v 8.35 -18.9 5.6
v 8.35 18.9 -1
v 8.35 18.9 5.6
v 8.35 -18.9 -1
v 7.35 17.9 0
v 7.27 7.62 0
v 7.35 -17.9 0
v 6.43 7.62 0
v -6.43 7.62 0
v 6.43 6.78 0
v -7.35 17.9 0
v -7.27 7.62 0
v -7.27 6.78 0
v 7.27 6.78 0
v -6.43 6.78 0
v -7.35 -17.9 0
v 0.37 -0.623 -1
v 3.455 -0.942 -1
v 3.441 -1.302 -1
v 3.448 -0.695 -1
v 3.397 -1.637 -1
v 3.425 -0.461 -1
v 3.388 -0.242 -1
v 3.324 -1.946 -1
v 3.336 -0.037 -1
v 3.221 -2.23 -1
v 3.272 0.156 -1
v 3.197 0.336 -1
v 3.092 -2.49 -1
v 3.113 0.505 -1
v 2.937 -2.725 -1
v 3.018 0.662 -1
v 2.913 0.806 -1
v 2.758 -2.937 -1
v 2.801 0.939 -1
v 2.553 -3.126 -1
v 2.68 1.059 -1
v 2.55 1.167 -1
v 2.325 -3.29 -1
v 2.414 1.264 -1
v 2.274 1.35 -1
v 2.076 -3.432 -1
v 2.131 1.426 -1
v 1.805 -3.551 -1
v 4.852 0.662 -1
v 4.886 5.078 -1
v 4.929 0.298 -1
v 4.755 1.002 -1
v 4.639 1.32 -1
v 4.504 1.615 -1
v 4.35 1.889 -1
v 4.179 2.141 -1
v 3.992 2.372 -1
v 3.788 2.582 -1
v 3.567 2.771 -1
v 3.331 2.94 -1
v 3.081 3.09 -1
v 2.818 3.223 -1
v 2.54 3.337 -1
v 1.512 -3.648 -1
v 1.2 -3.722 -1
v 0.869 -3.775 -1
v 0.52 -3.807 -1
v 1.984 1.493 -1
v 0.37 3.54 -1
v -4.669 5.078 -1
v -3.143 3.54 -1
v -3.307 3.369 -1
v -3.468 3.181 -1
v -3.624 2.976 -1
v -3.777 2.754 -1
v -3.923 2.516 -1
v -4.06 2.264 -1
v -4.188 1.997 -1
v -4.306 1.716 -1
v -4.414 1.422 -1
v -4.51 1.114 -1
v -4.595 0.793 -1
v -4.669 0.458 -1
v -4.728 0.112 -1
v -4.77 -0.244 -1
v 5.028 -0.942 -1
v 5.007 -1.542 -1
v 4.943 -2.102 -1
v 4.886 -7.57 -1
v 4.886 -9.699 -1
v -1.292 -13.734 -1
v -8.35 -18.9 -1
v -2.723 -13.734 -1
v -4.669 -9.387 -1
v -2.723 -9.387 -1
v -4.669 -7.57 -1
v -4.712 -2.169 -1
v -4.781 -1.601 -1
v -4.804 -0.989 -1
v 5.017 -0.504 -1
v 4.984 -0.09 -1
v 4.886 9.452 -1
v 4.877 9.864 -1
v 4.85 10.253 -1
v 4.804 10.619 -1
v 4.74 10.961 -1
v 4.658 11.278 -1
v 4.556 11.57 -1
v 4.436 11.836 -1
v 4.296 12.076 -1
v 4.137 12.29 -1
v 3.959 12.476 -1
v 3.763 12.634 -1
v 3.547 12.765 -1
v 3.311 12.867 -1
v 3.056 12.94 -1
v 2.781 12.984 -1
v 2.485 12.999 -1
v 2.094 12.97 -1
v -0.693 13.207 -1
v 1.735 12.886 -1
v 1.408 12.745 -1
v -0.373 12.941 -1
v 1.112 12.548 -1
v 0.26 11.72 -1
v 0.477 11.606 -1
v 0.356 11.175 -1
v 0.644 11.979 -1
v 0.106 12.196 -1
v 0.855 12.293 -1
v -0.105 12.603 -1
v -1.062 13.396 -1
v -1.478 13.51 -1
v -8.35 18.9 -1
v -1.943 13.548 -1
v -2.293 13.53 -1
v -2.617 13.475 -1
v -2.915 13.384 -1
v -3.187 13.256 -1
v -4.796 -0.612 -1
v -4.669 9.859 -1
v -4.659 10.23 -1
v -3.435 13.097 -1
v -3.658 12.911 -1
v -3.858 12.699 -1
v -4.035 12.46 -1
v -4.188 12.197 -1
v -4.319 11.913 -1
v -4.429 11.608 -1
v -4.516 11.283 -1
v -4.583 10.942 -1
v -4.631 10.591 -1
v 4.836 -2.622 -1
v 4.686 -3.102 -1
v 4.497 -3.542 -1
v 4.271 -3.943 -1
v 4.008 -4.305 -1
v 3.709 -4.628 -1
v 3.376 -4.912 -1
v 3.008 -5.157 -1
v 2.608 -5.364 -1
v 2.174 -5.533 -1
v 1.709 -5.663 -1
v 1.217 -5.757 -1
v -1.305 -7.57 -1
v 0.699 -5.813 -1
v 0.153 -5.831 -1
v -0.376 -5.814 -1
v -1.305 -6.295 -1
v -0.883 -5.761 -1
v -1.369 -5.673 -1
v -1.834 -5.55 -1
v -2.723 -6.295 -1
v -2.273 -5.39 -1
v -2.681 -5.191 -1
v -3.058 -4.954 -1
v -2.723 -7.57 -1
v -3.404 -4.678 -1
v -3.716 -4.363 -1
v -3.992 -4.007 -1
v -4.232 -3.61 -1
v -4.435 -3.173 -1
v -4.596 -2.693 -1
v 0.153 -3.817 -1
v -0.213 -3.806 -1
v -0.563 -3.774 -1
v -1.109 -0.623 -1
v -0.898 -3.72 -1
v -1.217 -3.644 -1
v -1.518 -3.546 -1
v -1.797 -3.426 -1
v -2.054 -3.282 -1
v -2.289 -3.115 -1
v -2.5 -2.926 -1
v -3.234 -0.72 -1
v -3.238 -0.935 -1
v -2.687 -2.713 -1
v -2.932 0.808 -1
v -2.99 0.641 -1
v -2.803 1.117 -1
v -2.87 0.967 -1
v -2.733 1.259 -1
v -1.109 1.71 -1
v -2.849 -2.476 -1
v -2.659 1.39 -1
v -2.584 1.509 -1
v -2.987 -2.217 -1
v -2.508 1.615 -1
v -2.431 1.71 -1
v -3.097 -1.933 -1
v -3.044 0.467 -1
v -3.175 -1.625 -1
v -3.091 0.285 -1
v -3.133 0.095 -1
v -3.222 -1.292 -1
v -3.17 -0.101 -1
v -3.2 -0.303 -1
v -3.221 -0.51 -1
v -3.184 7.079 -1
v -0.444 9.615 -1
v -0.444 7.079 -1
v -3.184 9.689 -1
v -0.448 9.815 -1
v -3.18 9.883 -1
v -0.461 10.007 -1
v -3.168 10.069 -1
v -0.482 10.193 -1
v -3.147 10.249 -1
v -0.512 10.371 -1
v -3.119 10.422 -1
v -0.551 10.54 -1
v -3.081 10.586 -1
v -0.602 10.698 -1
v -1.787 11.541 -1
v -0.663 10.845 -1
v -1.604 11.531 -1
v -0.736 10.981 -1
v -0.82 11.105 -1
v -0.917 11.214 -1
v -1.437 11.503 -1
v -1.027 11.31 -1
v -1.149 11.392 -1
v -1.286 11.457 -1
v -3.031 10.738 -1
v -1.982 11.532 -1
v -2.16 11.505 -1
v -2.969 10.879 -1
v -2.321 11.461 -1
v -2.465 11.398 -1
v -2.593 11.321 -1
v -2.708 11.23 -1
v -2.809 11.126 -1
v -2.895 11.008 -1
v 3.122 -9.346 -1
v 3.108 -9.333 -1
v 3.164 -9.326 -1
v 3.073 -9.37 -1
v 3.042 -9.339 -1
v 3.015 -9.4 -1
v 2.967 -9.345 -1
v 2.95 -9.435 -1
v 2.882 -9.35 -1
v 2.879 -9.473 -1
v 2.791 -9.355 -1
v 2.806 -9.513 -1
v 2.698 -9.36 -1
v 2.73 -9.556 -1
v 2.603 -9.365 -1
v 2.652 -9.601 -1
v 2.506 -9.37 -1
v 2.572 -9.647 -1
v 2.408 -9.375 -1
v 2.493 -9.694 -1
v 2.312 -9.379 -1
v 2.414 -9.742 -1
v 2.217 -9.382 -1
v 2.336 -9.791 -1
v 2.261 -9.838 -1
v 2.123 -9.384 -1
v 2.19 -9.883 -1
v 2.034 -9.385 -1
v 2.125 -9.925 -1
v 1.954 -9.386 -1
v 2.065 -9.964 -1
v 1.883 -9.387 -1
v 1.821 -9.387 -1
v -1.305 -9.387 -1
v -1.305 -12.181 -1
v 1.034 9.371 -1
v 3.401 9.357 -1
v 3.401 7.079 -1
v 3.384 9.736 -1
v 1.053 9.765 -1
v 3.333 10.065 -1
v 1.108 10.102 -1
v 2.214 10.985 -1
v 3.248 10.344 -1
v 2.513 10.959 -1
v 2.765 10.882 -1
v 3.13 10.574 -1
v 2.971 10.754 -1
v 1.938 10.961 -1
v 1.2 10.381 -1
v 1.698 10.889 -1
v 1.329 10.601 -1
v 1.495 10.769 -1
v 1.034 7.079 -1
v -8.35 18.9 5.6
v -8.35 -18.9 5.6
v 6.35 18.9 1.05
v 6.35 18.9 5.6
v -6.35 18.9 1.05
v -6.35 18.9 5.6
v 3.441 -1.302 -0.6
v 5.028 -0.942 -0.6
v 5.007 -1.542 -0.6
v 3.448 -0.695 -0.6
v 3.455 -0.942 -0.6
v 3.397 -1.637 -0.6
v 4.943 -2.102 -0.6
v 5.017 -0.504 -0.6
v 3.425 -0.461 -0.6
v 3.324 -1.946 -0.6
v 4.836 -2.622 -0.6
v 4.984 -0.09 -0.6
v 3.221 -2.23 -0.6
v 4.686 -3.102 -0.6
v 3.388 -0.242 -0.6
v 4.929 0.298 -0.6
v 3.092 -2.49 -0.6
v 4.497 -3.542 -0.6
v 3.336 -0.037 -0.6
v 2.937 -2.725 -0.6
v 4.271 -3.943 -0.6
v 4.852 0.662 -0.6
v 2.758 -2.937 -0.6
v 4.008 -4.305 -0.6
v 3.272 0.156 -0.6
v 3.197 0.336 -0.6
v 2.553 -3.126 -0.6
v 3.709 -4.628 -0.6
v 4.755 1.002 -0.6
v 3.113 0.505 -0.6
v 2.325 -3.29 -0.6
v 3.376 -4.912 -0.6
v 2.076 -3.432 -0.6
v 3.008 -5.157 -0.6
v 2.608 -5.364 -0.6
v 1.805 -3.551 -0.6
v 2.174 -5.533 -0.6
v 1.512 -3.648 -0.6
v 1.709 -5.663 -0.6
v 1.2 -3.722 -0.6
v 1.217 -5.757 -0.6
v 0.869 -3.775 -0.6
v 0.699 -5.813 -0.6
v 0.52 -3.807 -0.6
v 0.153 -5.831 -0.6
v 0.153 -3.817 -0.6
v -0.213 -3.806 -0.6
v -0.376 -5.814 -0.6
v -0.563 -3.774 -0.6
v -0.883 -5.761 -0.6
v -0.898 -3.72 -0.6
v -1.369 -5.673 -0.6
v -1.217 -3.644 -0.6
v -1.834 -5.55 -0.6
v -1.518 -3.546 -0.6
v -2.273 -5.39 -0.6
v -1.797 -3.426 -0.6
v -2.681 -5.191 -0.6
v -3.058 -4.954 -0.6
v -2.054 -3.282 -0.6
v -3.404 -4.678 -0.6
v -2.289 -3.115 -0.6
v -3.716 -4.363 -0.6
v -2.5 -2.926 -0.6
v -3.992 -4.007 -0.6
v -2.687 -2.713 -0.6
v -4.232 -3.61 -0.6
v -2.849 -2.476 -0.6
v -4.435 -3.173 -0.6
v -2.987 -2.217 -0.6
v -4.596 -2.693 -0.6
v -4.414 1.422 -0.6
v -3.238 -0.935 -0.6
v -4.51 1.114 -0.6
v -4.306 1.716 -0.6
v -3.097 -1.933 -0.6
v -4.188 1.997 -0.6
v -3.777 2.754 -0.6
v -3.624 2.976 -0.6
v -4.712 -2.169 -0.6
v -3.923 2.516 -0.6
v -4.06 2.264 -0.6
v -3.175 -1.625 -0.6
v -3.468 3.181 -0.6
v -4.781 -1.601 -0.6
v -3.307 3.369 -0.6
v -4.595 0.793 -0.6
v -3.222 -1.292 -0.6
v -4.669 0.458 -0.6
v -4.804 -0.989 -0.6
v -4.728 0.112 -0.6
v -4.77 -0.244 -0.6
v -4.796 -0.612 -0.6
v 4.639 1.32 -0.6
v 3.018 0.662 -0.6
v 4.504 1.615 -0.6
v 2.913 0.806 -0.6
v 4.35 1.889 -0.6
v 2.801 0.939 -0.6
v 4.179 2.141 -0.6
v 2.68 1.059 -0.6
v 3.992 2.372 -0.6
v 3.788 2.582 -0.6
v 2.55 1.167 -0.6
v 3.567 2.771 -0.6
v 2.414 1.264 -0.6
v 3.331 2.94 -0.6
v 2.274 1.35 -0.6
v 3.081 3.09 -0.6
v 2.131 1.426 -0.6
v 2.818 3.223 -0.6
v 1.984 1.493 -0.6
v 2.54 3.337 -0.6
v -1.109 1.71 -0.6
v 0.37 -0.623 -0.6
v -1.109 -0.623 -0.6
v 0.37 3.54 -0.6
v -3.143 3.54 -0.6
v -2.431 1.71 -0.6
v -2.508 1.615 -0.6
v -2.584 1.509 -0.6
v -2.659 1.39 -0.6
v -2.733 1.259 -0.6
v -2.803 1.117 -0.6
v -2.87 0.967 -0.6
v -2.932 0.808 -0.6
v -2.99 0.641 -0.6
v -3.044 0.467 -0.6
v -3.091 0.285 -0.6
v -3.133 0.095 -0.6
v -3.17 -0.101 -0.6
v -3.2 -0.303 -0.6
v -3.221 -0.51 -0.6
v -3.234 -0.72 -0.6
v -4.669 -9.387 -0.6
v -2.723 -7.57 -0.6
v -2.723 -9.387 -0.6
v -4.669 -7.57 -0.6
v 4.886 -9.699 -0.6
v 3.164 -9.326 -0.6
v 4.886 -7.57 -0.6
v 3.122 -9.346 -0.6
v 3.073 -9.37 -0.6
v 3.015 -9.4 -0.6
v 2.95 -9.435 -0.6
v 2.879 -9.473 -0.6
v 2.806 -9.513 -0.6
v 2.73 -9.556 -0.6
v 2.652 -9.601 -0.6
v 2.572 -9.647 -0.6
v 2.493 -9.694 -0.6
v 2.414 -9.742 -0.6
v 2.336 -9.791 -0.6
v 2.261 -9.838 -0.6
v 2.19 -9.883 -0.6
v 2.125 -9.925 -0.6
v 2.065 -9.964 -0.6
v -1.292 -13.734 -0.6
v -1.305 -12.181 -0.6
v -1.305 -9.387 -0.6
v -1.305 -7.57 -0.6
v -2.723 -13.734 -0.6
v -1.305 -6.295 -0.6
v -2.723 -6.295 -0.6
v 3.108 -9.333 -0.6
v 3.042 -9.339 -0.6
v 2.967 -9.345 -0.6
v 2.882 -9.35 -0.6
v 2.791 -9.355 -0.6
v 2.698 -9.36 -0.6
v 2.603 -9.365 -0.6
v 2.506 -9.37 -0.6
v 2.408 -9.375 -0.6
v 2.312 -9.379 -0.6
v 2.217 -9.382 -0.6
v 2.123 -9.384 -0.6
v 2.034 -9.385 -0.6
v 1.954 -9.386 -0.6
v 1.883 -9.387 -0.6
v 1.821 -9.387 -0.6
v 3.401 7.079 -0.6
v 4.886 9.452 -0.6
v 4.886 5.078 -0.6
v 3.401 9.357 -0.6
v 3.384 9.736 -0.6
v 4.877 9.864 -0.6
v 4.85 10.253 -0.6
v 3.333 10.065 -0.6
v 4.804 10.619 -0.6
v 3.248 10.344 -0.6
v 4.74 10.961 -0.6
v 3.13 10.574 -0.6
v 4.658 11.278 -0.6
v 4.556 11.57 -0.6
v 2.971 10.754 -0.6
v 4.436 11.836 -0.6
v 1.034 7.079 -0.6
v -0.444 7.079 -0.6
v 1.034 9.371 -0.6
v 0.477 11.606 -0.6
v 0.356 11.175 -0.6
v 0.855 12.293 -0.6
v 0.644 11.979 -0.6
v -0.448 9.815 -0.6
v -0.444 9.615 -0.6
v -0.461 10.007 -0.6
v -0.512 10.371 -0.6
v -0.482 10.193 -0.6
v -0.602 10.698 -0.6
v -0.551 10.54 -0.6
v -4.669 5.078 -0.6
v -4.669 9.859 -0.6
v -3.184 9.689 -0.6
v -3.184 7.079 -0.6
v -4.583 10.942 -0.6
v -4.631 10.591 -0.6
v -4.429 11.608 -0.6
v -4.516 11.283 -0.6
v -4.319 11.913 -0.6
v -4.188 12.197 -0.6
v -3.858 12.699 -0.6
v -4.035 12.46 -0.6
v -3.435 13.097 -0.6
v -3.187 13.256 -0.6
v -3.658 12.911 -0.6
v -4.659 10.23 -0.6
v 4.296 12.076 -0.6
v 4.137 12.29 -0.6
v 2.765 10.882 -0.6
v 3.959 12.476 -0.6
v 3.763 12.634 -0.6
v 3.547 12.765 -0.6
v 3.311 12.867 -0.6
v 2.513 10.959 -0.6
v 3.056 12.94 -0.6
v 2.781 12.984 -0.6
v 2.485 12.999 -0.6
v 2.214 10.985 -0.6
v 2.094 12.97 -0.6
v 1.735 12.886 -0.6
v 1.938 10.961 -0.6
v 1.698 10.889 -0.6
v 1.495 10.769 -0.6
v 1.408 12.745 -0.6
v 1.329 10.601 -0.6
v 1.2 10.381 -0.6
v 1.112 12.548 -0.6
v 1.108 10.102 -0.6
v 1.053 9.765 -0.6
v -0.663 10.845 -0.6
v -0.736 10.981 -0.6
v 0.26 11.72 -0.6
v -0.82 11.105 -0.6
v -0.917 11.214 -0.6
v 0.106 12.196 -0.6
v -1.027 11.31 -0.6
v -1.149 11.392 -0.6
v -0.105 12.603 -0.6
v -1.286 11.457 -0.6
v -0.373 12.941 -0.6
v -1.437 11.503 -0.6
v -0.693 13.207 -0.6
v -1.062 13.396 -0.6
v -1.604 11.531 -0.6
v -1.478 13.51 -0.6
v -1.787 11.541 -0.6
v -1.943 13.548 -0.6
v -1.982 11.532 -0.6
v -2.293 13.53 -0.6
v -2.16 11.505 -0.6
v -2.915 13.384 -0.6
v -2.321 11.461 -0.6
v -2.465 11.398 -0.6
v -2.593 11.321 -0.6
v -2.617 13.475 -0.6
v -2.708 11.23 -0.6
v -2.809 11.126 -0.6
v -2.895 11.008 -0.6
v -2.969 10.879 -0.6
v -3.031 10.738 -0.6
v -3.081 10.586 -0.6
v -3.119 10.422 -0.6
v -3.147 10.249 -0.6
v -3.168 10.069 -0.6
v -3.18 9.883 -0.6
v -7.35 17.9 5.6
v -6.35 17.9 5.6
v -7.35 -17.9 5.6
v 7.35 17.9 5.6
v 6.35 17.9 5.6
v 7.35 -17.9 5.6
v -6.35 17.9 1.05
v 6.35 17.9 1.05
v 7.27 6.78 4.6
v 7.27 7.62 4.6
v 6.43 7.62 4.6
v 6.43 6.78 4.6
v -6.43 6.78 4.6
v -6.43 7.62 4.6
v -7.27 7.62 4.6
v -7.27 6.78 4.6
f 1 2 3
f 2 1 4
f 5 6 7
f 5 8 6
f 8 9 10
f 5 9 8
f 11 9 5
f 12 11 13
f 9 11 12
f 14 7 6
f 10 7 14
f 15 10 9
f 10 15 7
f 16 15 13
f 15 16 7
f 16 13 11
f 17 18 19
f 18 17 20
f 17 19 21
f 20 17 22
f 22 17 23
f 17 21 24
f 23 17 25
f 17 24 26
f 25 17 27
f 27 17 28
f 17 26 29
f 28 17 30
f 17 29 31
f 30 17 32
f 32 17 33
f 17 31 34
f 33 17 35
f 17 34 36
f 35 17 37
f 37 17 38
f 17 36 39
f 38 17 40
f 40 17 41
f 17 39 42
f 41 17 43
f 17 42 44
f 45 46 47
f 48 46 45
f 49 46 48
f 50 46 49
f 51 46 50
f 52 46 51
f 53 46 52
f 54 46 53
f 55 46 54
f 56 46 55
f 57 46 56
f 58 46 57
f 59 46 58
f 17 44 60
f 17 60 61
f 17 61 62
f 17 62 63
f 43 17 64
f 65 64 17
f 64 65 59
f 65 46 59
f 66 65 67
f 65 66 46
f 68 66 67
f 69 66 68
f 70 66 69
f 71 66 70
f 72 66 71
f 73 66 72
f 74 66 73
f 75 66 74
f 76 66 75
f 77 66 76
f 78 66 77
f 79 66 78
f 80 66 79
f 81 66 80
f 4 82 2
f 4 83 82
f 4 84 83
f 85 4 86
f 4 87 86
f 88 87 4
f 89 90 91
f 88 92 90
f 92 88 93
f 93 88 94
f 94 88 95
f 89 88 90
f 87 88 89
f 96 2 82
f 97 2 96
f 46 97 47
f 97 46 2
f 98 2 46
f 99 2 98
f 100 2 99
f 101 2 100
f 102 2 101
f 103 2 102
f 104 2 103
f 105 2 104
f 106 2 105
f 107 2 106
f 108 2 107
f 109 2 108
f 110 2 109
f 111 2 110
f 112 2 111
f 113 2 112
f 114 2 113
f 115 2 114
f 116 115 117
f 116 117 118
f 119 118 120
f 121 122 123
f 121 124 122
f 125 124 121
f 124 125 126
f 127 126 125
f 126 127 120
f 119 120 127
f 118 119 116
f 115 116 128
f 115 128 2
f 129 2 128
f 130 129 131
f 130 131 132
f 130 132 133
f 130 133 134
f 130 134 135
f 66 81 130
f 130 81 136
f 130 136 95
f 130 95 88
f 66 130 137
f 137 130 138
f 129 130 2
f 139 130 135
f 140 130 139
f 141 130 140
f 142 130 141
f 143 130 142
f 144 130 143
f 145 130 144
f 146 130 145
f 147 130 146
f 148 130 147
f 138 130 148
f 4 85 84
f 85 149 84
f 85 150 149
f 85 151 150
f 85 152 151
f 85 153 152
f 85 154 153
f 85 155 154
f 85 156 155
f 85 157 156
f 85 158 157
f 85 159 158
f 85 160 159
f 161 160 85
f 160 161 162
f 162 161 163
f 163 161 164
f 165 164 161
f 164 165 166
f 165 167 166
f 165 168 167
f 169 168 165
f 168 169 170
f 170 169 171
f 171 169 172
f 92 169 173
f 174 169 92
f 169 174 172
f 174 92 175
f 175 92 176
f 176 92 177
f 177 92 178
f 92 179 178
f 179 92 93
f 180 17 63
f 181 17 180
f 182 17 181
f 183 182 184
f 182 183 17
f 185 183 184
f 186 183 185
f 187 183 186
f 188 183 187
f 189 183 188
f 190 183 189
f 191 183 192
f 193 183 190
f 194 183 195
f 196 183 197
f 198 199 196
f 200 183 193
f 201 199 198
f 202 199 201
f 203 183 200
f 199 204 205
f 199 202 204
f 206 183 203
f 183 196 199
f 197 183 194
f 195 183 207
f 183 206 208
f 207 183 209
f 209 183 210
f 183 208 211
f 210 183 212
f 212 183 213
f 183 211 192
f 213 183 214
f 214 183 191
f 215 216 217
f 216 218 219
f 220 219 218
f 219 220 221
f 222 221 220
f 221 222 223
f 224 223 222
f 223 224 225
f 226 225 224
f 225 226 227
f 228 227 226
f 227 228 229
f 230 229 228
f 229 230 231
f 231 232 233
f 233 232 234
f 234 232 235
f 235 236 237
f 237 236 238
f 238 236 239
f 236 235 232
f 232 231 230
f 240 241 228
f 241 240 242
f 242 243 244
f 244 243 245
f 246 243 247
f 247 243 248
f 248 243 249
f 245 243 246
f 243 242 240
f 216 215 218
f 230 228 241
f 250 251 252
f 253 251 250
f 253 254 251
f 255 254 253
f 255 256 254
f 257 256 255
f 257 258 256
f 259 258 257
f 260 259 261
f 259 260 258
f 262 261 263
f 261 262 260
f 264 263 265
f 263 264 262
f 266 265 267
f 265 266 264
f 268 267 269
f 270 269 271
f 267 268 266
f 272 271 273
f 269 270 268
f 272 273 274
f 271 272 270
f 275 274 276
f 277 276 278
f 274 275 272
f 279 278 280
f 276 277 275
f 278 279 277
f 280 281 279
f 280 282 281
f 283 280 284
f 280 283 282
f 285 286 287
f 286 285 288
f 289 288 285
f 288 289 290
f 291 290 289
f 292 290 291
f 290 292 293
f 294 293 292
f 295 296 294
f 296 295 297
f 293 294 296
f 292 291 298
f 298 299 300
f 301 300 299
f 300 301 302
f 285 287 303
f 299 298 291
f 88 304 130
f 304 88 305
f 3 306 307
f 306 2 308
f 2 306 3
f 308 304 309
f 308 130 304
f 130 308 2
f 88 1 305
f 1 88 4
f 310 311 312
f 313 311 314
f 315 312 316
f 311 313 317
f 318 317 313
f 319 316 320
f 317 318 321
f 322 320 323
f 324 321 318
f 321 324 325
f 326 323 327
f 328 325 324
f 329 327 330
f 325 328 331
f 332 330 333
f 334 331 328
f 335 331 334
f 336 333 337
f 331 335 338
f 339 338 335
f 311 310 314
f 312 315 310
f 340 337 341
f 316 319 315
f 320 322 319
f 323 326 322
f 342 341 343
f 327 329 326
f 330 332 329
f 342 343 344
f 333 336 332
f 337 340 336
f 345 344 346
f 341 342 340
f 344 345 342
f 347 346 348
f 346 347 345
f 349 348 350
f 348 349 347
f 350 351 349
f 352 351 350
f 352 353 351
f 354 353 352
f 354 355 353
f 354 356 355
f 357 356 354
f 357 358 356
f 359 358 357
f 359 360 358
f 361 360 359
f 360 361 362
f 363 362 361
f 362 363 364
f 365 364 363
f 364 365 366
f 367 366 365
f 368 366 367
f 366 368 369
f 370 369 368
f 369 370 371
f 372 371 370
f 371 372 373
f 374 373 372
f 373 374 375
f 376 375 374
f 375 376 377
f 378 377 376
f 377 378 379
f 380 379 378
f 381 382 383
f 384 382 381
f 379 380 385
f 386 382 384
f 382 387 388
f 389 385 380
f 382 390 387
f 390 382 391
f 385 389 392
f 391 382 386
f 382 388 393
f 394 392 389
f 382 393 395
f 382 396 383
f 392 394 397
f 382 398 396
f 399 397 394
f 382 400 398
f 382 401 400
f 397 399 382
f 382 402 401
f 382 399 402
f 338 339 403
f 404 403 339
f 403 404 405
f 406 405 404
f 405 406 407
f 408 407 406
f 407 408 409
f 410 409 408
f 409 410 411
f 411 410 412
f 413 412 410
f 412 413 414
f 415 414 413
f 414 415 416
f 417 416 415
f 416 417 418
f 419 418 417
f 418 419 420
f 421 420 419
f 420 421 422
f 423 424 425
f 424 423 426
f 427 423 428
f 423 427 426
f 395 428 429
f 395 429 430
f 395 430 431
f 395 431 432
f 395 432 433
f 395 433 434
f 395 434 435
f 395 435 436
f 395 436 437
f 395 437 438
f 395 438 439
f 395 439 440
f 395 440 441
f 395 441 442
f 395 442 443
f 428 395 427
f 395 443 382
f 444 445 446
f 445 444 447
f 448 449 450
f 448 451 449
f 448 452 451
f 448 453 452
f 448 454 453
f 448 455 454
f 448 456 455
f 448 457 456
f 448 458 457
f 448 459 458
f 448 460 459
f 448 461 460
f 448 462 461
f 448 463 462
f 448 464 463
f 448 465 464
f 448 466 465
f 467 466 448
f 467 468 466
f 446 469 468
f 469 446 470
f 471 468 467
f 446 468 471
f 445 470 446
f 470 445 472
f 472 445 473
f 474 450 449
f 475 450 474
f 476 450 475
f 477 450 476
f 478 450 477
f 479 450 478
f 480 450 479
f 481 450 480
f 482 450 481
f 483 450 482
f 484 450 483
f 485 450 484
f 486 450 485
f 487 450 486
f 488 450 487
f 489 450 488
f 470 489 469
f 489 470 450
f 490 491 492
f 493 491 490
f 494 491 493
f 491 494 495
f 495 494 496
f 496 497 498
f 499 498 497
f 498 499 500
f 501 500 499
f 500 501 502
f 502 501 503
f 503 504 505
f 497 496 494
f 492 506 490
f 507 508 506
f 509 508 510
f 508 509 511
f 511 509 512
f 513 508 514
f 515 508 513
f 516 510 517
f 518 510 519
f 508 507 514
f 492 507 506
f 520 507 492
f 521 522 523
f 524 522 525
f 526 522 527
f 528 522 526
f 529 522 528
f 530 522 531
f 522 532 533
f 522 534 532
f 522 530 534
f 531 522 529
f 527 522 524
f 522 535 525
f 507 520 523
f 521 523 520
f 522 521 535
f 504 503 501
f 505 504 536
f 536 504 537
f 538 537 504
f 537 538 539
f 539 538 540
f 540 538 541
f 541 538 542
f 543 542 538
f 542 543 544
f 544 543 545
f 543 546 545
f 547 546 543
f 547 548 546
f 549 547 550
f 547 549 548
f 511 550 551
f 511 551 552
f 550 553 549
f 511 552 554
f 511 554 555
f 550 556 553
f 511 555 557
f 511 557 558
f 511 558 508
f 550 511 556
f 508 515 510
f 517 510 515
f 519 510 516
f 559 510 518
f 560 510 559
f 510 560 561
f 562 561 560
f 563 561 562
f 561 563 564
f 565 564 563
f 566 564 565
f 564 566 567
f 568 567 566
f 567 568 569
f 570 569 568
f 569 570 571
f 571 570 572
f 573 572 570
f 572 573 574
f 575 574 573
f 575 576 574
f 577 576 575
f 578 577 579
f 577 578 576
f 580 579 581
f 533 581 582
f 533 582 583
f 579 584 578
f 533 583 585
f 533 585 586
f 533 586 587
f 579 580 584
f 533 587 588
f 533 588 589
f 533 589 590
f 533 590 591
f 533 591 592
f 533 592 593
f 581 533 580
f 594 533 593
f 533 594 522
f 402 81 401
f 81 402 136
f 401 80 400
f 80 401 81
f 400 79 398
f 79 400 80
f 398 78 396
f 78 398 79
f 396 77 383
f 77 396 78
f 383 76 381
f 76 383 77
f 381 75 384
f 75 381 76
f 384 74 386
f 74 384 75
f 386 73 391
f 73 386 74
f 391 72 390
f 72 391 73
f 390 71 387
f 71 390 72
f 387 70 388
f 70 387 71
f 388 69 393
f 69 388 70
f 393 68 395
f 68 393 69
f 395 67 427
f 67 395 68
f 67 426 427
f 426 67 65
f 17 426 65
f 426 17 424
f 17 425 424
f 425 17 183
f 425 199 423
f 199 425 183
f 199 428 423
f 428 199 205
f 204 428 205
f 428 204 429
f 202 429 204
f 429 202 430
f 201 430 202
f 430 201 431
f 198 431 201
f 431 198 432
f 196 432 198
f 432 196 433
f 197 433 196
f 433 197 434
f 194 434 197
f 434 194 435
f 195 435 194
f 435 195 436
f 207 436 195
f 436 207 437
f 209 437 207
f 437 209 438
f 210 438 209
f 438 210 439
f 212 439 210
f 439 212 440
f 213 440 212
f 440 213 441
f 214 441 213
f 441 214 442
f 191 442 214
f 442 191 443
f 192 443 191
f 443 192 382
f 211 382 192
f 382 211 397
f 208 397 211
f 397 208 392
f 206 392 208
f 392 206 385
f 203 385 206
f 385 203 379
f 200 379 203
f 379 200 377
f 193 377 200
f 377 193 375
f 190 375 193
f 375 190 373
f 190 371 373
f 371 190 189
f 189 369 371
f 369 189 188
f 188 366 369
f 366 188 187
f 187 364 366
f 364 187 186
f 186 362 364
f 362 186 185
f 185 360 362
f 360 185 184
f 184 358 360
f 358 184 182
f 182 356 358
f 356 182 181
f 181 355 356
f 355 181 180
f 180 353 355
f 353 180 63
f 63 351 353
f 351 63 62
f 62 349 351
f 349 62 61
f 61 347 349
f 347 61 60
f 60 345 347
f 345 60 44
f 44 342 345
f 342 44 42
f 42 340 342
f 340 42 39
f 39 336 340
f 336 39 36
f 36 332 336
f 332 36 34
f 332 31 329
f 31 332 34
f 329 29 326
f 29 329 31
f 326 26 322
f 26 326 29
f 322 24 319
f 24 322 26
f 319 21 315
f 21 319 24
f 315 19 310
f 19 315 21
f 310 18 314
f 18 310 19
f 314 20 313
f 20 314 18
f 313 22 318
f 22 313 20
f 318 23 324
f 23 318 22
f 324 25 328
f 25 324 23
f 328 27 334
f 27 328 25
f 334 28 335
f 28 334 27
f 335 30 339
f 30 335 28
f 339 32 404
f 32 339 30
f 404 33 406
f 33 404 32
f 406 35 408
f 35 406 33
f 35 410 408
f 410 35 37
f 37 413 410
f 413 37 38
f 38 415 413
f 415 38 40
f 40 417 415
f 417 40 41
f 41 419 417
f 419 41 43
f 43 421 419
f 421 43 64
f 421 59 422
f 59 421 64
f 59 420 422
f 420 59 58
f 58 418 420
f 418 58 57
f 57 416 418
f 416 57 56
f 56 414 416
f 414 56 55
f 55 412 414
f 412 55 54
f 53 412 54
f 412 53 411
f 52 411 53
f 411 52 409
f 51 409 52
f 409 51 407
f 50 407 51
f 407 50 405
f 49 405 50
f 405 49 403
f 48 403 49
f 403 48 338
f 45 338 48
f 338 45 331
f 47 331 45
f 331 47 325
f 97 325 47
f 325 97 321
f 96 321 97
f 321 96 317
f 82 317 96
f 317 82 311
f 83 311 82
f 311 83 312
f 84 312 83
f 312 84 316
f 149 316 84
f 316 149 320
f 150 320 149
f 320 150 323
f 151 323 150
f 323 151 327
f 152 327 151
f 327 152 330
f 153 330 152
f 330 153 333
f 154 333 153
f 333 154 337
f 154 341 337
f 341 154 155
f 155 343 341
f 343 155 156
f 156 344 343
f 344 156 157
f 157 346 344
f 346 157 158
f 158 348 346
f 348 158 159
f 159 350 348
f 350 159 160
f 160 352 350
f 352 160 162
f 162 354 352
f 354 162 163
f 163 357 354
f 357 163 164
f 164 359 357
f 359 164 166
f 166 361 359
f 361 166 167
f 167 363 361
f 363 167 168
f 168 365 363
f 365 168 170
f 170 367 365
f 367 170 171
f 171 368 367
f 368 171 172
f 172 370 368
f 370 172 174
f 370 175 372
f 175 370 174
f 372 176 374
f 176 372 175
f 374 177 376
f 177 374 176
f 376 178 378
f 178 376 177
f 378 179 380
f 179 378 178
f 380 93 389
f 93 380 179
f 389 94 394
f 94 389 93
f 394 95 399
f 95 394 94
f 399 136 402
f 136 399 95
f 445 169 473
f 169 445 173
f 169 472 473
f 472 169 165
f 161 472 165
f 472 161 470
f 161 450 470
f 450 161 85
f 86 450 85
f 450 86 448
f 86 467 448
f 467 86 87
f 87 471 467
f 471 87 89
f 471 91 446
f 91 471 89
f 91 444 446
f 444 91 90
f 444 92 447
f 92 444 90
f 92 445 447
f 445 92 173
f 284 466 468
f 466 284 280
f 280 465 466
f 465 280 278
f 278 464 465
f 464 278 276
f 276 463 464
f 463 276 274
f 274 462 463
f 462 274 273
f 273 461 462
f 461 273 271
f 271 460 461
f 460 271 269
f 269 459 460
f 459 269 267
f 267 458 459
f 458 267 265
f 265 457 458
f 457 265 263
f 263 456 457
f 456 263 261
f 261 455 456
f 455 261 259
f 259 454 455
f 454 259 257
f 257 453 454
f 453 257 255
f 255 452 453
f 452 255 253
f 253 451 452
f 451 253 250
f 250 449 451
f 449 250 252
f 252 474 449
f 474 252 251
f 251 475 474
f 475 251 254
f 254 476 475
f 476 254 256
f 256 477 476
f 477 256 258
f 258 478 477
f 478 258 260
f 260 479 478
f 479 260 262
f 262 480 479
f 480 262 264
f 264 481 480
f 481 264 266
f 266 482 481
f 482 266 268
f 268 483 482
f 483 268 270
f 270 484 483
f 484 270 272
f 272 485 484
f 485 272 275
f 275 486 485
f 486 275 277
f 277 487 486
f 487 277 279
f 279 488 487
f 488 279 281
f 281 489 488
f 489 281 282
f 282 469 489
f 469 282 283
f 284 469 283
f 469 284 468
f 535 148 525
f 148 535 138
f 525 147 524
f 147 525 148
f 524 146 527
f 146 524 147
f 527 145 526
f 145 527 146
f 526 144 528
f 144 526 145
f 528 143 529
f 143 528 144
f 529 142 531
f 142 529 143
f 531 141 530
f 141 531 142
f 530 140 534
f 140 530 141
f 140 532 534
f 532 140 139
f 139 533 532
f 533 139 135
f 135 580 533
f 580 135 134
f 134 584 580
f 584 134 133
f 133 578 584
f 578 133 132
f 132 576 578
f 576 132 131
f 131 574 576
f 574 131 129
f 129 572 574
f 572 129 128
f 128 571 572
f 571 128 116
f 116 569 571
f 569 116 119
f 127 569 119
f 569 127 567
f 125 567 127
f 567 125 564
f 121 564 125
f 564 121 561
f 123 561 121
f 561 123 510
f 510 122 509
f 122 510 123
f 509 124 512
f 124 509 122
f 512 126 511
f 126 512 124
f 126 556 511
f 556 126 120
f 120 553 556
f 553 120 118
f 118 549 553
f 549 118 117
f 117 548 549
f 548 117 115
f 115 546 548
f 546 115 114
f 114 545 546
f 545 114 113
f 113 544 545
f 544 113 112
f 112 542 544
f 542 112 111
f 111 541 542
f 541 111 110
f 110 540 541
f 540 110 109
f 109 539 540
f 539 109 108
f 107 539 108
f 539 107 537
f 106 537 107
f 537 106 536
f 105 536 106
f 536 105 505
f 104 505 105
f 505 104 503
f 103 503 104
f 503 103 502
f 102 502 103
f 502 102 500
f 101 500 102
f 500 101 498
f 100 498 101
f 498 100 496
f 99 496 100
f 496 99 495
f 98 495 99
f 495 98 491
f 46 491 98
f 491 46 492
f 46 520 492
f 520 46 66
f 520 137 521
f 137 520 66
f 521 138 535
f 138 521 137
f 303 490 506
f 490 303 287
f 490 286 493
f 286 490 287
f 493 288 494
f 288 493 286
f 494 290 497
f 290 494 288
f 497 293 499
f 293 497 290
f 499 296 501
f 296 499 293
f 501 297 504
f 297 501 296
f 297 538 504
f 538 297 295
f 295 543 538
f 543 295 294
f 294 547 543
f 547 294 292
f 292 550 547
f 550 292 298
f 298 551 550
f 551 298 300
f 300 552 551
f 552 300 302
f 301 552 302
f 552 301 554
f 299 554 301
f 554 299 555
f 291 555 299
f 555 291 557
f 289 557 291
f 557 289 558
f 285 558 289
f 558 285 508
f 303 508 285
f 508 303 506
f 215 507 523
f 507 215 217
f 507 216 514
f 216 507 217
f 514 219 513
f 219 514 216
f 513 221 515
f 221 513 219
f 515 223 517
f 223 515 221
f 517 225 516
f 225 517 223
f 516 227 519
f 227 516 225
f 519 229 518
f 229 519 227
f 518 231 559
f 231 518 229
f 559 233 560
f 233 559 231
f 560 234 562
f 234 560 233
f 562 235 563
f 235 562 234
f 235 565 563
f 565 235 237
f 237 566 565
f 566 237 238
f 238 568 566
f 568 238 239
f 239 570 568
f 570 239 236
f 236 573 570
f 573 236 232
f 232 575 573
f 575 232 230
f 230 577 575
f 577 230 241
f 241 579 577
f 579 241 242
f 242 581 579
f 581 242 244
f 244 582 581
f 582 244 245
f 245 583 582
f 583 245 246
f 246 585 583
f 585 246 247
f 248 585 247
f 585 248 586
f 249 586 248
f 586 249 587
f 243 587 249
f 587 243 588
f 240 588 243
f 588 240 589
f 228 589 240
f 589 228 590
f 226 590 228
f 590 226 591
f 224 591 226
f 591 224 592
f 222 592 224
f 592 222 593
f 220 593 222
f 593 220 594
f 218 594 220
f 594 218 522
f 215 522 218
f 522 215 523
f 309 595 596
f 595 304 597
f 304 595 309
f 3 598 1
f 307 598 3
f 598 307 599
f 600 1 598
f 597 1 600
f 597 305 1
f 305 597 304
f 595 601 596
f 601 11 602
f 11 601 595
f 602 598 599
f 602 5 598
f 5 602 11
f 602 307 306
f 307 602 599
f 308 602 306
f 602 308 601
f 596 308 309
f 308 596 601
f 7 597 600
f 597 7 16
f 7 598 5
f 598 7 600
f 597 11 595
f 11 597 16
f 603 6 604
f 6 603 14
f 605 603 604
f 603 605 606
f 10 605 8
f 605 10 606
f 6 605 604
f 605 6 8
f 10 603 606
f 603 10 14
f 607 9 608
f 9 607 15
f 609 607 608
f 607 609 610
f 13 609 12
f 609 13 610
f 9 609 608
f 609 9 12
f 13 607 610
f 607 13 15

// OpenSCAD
notchDepth = 1.2; //Depth of slots on the side of the PCB
notchWidth = 1.2; //Width of slots on the side of the PCB
portLength = 23.4; //Distance between the front of the slot to the end of the USB port
boardLength = 23.4; //Dsitance from the rear of the slot to the back of the board
boardWidth = 14.7; // Width from one side of the board to the other, you may want to add some tolerance
capacity = "4GB"; //The capacity of the drive to be written on the bottom
textSize = 10; // If you have a very large or small drive you can change the text size (default = 6)

USBLength = 12.2; // The required length of protruding port (should remain constant)
USBHeight = 4.6; // The height of a USB port (should remain constant)
USBWidth = 12.7; // The width of a USB port (should remain constant)

unitLength = boardLength+notchWidth+(portLength-USBLength)+2;
difference(){
    translate([0, 0, -0.5])
        cube([boardWidth+2, unitLength,1], center=true);
    translate([0,0,-0.6])
        rotate([180,0,90])
            linear_extrude(height = 0.5)
                text(text = capacity, font = "Liberation Sans:style=Bold", size = textSize, valign = "center", halign = "center");
}
translate([0, (unitLength-1)/-2, ((USBHeight+2)/2)-1])
    cube([boardWidth+2, 1, USBHeight+2], center=true);
difference(){
    translate([0, (unitLength-1)/2, ((USBHeight+2)/2)-1])
        cube([boardWidth+2, 1, USBHeight+2], center=true);
    translate([0, (unitLength-1)/2, ((USBHeight+2)/2)+0.1])
        cube([USBWidth, 1.1, USBHeight+0.1], center=true);
}
translate([(boardWidth/2)+0.5, 0, ((USBHeight+2)/2)-1])
    cube([1, unitLength, USBHeight+2],center = true);
translate([-(boardWidth/2)-0.5, 0, ((USBHeight+2)/2)-1])
    cube([1, unitLength, USBHeight+2],center = true);
translate([(boardWidth/2)-0.5, ((unitLength-1)/2)-(portLength-USBLength), ((USBHeight)/2)])
    cube([notchDepth-(notchDepth*0.3), notchWidth-(notchWidth*0.3), USBHeight], center = true);
translate([(boardWidth/-2)+0.5, ((unitLength-1)/2)-(portLength-USBLength), ((USBHeight)/2)])
    cube([notchDepth-(notchDepth*0.3), notchWidth-(notchWidth*0.3), USBHeight], center = true);
